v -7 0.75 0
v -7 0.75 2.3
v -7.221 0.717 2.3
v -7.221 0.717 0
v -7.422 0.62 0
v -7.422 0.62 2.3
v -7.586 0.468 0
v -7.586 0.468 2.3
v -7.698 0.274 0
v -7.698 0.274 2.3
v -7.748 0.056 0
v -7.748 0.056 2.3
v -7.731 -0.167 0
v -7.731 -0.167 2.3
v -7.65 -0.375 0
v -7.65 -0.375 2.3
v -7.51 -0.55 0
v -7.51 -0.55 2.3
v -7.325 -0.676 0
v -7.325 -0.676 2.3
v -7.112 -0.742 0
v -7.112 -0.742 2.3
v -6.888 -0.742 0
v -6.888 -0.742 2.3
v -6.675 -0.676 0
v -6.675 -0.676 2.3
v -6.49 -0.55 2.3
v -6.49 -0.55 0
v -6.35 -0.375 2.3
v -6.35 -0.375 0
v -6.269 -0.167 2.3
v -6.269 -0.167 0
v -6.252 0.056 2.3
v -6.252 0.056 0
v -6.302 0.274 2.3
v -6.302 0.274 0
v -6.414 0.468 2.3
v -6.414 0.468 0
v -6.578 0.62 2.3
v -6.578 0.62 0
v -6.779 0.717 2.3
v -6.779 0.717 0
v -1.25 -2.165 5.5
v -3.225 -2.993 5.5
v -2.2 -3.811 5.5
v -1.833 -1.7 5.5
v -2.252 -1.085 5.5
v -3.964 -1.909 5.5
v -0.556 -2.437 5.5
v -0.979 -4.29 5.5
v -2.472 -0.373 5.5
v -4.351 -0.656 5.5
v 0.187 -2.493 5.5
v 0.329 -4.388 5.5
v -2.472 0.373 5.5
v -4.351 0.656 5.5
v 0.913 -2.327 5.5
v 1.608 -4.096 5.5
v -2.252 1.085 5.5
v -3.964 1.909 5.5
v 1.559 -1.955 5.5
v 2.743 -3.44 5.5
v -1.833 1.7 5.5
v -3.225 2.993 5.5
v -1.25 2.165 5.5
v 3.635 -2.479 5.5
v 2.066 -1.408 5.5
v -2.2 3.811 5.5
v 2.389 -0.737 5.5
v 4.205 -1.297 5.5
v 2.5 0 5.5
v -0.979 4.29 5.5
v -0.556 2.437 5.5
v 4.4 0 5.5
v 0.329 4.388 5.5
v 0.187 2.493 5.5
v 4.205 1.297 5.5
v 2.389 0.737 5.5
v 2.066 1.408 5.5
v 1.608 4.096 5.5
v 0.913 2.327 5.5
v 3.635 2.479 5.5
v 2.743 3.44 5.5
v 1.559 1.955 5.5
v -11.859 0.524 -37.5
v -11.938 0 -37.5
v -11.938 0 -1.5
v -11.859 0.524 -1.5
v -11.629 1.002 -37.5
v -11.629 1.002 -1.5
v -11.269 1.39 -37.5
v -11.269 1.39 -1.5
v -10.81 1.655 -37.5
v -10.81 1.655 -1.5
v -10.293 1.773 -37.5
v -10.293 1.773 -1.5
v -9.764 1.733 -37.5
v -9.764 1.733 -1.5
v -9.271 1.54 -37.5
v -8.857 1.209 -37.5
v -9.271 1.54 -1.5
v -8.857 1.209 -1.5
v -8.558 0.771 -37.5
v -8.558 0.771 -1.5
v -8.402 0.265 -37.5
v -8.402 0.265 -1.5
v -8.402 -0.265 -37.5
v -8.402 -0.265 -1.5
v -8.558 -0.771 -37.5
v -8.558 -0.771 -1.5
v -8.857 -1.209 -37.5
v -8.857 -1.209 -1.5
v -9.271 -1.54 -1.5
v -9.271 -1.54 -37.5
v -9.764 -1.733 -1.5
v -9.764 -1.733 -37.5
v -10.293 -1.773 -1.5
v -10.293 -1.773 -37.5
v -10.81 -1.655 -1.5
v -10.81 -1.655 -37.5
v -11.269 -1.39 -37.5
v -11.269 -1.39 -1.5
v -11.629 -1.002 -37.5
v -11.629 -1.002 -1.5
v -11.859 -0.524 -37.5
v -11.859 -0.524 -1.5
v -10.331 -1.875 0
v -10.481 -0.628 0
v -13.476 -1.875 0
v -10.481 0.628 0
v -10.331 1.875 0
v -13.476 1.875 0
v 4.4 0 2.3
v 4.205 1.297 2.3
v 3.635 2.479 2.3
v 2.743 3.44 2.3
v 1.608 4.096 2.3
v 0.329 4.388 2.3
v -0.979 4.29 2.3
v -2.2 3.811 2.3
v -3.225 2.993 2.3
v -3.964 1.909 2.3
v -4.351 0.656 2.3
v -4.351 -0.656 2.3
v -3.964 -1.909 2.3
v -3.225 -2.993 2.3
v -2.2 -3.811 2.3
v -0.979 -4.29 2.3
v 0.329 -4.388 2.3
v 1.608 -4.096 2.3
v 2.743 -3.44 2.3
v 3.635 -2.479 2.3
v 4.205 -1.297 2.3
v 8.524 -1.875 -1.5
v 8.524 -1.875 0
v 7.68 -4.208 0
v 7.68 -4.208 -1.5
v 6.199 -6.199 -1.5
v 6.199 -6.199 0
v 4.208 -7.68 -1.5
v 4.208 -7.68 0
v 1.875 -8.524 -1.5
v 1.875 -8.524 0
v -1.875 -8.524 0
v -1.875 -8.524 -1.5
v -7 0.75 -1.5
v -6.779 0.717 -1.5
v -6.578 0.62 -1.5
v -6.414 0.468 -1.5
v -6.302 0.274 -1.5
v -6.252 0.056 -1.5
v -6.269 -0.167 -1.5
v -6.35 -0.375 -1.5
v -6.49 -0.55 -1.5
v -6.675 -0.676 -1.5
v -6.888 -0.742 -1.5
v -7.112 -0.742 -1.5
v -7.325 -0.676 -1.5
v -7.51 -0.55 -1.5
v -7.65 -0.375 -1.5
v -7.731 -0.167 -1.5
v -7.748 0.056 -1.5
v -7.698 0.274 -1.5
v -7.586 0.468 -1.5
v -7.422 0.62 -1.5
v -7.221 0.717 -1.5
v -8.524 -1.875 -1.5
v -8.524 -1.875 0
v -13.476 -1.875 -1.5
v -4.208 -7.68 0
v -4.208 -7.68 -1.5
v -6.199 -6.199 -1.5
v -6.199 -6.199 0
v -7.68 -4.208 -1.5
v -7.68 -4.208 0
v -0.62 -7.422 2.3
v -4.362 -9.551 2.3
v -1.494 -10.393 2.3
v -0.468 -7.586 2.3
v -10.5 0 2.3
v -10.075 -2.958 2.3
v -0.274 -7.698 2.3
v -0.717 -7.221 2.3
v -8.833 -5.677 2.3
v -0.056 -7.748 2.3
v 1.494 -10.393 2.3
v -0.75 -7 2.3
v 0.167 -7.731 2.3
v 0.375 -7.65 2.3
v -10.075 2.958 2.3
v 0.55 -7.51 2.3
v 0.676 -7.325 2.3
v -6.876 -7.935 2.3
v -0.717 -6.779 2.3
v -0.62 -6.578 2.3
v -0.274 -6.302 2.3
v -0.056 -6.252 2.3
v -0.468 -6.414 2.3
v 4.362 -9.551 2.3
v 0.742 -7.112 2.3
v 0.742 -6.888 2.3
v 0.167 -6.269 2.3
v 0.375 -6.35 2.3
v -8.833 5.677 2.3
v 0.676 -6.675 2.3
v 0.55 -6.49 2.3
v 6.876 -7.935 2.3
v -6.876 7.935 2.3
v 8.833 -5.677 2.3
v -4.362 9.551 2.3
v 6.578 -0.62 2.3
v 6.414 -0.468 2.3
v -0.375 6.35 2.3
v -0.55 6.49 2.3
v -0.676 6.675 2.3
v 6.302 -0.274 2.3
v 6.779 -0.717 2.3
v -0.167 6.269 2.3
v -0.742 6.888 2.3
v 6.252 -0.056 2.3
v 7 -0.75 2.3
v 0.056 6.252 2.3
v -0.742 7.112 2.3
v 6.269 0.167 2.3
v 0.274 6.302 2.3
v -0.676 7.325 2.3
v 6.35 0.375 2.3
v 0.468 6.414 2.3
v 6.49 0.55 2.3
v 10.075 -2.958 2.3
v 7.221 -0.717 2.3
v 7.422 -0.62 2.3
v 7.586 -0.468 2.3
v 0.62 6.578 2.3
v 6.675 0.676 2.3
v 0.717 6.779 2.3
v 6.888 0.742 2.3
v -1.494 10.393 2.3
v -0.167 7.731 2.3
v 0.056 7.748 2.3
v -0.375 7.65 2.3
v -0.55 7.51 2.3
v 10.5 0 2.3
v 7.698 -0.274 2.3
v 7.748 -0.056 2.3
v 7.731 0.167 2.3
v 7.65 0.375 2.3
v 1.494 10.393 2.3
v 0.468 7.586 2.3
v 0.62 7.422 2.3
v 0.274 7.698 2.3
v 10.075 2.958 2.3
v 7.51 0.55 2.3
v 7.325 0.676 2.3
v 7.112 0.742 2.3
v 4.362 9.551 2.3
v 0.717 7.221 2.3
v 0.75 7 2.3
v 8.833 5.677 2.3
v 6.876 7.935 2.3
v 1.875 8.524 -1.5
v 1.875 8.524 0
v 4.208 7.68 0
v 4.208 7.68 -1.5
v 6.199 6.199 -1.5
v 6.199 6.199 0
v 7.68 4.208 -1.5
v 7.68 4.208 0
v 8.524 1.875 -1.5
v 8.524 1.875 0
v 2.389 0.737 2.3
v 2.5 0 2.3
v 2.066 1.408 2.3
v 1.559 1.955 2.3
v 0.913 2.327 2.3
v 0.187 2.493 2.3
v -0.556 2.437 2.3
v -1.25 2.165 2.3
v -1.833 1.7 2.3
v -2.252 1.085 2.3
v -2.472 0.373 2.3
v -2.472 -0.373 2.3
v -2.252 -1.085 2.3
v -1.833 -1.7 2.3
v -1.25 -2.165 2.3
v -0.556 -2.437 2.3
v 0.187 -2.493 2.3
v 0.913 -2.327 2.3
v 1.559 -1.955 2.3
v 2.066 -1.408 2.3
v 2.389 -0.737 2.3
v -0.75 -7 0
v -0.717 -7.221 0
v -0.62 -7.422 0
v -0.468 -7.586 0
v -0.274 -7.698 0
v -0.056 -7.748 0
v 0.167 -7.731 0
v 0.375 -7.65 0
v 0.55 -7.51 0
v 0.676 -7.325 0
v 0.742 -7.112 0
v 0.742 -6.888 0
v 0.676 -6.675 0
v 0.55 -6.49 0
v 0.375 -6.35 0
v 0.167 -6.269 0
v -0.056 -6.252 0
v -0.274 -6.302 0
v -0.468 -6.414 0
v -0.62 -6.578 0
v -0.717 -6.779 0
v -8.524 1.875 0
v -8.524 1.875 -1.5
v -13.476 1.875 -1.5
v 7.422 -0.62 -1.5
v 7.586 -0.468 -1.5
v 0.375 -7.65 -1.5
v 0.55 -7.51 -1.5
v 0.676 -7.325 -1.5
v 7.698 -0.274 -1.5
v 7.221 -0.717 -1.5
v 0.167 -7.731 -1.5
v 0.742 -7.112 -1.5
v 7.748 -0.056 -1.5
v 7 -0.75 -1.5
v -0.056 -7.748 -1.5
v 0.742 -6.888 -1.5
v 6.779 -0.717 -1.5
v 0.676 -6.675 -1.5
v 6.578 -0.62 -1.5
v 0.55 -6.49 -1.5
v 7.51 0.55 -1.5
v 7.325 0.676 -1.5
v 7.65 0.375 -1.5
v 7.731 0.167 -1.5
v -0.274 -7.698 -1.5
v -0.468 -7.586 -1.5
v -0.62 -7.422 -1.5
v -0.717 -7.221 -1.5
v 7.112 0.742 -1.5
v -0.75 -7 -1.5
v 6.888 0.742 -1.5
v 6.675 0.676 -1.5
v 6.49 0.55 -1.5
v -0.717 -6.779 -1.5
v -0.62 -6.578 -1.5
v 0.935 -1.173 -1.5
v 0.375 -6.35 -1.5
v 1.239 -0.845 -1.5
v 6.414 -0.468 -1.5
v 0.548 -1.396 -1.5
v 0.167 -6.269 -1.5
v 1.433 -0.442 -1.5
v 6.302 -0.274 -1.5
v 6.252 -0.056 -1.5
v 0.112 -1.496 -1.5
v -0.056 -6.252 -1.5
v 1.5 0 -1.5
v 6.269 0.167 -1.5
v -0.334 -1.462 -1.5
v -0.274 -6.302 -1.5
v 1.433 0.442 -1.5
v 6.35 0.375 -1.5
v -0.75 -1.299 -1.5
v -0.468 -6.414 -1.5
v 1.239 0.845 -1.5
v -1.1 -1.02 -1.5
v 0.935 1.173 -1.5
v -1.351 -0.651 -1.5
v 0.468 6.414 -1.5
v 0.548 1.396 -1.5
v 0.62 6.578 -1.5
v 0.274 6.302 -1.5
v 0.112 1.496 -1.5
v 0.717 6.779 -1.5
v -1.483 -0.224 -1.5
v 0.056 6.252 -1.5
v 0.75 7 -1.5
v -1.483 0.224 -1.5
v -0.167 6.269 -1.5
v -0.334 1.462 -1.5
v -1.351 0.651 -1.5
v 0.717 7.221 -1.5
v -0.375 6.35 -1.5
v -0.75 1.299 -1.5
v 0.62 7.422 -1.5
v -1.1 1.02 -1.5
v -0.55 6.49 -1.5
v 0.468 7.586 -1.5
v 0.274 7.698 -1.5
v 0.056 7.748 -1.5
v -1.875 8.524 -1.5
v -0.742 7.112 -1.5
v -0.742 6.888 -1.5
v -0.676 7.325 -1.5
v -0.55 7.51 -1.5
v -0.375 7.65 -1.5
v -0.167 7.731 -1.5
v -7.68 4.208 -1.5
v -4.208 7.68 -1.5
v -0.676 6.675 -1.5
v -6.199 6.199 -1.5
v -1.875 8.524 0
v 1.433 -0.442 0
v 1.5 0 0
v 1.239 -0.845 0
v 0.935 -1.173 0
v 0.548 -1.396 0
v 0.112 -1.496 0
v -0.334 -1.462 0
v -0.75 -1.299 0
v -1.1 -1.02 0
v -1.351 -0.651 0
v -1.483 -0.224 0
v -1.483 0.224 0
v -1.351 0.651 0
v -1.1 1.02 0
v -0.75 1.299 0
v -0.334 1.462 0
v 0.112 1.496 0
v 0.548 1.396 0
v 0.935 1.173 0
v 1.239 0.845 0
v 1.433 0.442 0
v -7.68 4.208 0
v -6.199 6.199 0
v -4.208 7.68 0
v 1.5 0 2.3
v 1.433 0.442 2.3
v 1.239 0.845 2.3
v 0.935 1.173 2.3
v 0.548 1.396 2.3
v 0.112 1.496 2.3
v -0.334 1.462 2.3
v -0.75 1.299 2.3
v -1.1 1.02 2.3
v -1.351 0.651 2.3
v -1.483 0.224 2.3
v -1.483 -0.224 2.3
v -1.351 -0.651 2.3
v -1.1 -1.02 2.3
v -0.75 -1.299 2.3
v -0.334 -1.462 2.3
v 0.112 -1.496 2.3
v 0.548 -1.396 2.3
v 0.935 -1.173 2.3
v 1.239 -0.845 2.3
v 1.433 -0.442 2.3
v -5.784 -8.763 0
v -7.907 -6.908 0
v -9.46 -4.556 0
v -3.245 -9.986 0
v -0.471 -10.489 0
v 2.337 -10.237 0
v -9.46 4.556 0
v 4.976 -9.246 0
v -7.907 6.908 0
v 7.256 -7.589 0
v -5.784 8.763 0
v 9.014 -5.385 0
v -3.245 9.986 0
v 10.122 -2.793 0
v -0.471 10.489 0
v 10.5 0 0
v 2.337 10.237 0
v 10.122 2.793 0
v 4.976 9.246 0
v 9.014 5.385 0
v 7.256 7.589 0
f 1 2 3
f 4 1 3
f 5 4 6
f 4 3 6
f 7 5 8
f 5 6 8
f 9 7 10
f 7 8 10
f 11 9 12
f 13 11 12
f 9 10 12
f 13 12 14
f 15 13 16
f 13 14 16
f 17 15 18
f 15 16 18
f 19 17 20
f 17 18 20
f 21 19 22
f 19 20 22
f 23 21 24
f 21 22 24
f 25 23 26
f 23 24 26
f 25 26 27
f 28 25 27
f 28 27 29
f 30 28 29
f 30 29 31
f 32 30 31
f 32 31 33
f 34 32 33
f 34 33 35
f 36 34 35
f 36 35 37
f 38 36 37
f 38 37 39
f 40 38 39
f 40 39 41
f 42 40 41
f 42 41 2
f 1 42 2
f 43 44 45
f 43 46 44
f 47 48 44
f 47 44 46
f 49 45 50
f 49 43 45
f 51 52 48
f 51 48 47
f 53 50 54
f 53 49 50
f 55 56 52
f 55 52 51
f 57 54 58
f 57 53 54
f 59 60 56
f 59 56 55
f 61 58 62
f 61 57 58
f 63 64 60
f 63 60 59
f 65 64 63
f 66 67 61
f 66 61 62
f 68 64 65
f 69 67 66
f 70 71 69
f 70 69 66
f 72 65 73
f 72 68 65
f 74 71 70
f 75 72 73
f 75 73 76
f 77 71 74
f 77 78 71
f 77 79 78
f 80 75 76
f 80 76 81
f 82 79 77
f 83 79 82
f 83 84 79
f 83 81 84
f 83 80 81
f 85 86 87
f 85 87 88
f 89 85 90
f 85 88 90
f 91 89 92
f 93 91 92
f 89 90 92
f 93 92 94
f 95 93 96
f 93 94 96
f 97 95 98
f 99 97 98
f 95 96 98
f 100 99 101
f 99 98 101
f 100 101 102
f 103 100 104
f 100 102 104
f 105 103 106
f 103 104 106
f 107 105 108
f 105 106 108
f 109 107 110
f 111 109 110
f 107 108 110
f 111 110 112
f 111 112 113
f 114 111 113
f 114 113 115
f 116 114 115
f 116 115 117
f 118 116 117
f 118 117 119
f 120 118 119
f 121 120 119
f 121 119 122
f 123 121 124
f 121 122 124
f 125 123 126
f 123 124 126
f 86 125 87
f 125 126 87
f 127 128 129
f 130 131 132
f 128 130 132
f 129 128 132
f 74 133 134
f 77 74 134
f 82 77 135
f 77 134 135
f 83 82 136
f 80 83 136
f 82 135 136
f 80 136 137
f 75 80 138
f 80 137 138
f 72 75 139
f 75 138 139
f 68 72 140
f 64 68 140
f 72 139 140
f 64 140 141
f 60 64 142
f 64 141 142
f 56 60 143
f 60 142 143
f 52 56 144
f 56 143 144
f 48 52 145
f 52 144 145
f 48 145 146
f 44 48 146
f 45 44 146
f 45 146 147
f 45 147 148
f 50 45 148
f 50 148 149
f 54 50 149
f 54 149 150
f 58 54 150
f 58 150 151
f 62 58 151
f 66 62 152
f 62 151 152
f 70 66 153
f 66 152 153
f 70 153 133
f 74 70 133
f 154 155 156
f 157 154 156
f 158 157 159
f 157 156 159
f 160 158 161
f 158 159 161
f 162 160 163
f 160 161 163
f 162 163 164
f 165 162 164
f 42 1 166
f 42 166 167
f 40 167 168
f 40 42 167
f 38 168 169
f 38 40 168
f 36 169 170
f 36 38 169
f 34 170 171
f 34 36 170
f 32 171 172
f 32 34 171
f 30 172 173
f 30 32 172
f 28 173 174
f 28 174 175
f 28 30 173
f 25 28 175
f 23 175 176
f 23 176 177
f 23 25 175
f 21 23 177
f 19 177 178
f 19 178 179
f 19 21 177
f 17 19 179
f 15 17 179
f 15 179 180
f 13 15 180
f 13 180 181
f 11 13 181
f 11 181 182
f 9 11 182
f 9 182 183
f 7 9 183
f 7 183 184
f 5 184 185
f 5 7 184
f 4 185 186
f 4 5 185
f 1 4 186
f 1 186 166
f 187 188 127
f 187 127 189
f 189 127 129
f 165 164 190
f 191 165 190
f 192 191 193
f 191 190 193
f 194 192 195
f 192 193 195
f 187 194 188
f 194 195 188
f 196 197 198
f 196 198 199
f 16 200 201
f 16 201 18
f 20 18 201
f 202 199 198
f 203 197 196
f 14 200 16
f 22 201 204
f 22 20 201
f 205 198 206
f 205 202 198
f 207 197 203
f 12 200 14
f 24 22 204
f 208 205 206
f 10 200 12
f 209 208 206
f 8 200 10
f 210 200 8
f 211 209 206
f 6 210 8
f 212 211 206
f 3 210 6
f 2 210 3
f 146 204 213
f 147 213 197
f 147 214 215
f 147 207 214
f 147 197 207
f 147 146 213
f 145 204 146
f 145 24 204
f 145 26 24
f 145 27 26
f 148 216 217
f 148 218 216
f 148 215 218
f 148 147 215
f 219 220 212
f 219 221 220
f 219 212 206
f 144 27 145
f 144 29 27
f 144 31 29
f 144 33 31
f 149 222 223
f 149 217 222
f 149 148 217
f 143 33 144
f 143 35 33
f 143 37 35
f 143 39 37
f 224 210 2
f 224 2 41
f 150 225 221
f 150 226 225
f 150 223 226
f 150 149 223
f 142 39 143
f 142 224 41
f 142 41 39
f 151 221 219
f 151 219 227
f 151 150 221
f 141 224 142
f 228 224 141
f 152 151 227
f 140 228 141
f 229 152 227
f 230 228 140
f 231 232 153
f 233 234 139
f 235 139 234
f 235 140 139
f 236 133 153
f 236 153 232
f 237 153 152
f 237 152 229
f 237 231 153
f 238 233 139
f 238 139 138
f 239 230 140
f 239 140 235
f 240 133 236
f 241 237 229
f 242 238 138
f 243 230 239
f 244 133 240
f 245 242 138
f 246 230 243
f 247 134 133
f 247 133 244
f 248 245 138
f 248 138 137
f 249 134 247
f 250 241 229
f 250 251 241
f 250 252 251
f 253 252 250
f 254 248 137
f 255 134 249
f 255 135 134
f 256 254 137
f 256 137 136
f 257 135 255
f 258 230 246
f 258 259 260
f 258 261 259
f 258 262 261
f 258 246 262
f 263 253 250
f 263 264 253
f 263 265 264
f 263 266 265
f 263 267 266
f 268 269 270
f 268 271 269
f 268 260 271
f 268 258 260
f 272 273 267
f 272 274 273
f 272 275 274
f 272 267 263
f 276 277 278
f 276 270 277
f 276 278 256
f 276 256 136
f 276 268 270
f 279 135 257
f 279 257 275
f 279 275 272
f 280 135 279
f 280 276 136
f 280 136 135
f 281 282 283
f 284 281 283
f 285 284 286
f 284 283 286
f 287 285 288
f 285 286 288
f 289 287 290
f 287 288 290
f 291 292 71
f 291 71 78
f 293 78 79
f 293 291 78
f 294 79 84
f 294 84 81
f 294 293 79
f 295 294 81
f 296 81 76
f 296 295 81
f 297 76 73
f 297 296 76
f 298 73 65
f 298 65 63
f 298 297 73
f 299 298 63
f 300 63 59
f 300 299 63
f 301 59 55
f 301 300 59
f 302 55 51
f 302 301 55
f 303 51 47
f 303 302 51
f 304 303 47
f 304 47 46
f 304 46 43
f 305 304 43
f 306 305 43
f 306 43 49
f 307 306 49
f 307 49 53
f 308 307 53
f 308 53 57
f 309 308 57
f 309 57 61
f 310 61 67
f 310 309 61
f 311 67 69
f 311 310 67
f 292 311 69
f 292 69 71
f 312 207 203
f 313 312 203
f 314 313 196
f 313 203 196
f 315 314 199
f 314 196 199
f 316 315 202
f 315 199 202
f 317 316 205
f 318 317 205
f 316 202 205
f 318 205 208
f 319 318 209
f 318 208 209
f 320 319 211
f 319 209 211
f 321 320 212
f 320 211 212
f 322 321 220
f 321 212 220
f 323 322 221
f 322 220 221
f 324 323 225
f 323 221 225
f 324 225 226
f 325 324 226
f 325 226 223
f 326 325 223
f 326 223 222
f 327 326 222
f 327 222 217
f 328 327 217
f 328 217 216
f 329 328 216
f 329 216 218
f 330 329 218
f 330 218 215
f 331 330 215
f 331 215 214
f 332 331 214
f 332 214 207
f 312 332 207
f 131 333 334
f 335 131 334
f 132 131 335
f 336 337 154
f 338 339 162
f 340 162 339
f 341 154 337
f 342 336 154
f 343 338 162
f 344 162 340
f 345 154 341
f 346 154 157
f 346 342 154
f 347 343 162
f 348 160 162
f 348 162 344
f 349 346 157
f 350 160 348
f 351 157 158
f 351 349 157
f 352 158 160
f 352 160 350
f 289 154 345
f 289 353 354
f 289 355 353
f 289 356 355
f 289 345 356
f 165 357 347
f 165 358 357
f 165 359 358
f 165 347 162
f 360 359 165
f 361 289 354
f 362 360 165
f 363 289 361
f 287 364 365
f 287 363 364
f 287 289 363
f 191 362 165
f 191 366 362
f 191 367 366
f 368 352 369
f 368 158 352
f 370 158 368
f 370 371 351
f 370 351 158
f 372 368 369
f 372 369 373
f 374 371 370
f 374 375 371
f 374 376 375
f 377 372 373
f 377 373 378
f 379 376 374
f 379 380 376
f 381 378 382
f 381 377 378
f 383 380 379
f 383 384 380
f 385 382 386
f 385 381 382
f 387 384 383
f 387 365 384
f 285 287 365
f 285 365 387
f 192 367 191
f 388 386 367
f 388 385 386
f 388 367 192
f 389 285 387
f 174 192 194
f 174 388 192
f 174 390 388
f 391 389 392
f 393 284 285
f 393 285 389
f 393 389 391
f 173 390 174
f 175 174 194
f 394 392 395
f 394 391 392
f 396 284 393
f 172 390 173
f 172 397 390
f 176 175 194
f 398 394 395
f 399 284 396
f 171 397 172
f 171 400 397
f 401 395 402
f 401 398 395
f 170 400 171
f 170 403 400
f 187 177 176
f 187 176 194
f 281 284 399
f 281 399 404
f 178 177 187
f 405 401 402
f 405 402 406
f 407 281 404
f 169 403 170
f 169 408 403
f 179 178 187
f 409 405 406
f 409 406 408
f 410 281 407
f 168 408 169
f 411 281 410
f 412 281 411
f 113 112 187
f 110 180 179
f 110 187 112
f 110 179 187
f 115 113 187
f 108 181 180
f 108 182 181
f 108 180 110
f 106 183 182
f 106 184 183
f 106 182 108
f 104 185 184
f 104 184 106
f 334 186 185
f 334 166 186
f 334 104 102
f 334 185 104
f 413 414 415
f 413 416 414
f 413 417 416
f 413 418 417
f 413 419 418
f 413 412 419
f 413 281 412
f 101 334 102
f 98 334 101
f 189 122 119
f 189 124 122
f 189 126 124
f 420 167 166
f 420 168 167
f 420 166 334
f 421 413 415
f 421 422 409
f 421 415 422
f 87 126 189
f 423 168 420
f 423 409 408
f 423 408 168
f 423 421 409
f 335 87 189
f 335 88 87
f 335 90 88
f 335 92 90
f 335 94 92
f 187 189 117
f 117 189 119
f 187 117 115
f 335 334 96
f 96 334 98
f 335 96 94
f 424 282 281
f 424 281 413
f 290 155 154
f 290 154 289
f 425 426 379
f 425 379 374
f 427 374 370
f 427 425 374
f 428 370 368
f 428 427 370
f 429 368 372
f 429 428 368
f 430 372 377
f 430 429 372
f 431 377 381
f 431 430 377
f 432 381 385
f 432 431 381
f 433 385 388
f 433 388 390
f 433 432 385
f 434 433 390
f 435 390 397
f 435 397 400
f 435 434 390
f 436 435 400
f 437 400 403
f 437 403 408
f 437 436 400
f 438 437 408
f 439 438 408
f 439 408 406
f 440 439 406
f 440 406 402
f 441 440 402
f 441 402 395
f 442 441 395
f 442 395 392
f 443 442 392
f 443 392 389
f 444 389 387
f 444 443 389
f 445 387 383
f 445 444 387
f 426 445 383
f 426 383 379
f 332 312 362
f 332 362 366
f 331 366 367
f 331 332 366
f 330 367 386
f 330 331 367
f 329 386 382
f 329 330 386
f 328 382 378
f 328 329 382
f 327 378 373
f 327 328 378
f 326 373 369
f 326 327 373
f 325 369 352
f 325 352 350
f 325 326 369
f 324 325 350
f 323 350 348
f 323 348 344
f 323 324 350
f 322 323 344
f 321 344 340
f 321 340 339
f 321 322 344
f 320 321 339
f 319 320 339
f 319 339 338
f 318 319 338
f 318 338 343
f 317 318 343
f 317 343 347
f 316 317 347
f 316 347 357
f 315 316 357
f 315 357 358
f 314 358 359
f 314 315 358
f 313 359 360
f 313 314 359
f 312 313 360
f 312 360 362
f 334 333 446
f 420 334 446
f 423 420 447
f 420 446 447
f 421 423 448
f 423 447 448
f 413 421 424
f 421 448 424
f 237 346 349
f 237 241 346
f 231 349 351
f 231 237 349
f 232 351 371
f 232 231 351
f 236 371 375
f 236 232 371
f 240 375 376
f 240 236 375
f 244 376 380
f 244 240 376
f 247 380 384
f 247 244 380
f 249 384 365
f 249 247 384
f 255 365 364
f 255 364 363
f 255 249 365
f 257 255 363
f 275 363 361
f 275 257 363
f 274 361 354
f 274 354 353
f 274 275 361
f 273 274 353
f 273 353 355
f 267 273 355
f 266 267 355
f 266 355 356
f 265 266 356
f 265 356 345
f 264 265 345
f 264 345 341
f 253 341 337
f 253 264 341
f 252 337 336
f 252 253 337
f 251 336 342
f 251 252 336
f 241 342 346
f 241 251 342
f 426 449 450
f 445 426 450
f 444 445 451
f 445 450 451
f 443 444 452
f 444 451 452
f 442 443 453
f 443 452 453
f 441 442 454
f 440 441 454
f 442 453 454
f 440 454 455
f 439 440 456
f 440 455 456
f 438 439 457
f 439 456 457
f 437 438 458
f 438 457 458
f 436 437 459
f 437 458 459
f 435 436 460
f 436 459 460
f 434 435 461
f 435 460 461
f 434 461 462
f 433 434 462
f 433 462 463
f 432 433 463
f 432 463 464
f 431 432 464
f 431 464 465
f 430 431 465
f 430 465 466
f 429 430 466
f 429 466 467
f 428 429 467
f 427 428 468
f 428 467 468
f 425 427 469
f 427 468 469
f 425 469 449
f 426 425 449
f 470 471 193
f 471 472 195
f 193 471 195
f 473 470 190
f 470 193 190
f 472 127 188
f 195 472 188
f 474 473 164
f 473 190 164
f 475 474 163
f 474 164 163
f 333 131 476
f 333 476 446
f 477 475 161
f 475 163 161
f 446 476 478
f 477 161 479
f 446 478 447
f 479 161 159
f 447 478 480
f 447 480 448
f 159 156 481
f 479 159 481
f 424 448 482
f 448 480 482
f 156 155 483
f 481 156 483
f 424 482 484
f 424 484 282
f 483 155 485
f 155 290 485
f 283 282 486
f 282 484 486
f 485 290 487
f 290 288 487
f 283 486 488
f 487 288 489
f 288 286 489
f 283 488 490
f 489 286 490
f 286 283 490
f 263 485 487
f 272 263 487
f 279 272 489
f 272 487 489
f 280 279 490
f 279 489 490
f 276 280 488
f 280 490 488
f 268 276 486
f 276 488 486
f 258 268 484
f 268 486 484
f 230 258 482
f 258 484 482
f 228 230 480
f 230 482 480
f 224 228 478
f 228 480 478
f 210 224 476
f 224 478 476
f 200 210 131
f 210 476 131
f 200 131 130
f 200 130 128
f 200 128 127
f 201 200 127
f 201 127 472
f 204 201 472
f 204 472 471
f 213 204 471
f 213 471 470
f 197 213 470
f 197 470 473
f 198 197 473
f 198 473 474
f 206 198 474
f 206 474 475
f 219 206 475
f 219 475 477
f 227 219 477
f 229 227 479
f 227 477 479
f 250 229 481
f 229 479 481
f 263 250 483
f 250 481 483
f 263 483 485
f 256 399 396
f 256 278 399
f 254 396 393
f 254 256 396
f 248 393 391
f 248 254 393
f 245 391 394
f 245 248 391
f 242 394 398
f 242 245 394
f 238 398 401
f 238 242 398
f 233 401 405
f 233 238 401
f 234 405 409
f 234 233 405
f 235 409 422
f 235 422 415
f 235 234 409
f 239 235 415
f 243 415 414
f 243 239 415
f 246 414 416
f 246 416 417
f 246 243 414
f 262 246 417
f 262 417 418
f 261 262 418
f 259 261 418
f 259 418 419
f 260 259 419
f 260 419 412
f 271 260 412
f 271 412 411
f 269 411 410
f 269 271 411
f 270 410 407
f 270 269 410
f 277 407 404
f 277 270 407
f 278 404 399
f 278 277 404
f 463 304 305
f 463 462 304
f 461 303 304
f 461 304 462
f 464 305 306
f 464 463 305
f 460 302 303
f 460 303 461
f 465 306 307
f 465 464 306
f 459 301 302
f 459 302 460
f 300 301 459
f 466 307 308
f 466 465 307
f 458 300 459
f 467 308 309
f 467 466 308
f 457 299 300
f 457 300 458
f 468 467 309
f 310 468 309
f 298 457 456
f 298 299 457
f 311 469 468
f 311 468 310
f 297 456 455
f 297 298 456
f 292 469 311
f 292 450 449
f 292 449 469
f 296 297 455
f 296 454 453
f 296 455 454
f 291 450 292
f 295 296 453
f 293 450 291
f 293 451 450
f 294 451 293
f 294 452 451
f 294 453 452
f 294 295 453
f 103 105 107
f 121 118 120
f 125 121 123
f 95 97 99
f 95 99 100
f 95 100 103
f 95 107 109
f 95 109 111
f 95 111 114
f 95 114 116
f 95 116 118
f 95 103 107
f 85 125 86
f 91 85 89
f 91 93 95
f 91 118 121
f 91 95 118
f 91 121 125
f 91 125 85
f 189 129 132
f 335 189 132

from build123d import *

# Parameters (mm, degrees)
SKETCH1_R           = 10.5
BOSS_EXTRUDE1_DEPTH = 2.3
SKETCH2_R           = 0.75
CUT_EXTRUDE1_DEPTH  = 16.026310259
SKETCH3_R           = 1.5
CUT_EXTRUDE2_DEPTH  = 2.3
CIRPATTERN1_COUNT   = 4
SKETCH4_R           = 4.4
SKETCH4_R_2         = 2.5
BOSS_EXTRUDE2_DEPTH = 3.2
SKETCH5_W           = 22
SKETCH5_H           = 3.75
SKETCH5_R           = 0.75
SKETCH5_R_2         = 1.5
BOSS_EXTRUDE3_DEPTH = 1.5
SKETCH6_R           = 1.778
BOSS_EXTRUDE4_DEPTH = 36
SKETCH7_W           = 3.75
SKETCH7_H           = 6.6491
SKETCH7_R           = 0.75
BOSS_EXTRUDE5_DEPTH = 1.5


with BuildPart() as part:
    # Sketch1 → Boss-Extrude1 (new body)
    with BuildSketch(Plane.XY):
        Circle(SKETCH1_R)
    extrude(amount=BOSS_EXTRUDE1_DEPTH)

    # Sketch2 → Cut-Extrude1 (cut, through all)
    with BuildSketch(Plane.XY.offset(2.3)):
        with Locations((0, 7)):
            Circle(SKETCH2_R)
    cut_extrude1 = extrude(amount=-CUT_EXTRUDE1_DEPTH, mode=Mode.SUBTRACT)

    # Sketch3 → Cut-Extrude2 (cut)
    with BuildSketch(Plane.XY.offset(2.3)):
        Circle(SKETCH3_R)
    extrude(amount=-CUT_EXTRUDE2_DEPTH, mode=Mode.SUBTRACT)

    # CirPattern1: Cut-Extrude1 ×4 about axis
    cirpattern1_axis = Axis((0, 0, 0), (0, 0, 1))
    for i in range(1, CIRPATTERN1_COUNT):
        add(cut_extrude1.rotate(cirpattern1_axis, i * 360 / CIRPATTERN1_COUNT), mode=Mode.SUBTRACT)

    # Sketch4 → Boss-Extrude2 (add)
    with BuildSketch(Plane.XY.offset(2.3)):
        Circle(SKETCH4_R)
        Circle(SKETCH4_R_2, mode=Mode.SUBTRACT)
    extrude(amount=BOSS_EXTRUDE2_DEPTH)

    # Sketch5 → Boss-Extrude3 (add)
    with BuildSketch(Plane(origin=(0, 0, 0), x_dir=(-1, 0, 0), z_dir=(0, 0, -1))):
        with Locations((2.475846117, 0)):
            Rectangle(SKETCH5_W, SKETCH5_H)
        with Locations(Location((7, 0, 0), (0, 0, 90))):
            Circle(SKETCH5_R, mode=Mode.SUBTRACT)
        with Locations(Location((-7, 0, 0), (0, 0, 270))):
            Circle(SKETCH5_R, mode=Mode.SUBTRACT)
        with Locations(Location((0, 0, 0), (0, 0, 180))):
            Circle(SKETCH5_R_2, mode=Mode.SUBTRACT)
    extrude(amount=BOSS_EXTRUDE3_DEPTH)

    # Sketch6 → Boss-Extrude4 (add)
    with BuildSketch(Plane(origin=(0, 0, -1.5), x_dir=(-1, 0, 0), z_dir=(0, 0, -1))):
        with Locations((10.16, 0)):
            Circle(SKETCH6_R)
    extrude(amount=BOSS_EXTRUDE4_DEPTH)

    # Sketch7 → Boss-Extrude5 (add)
    with BuildSketch(Plane(origin=(0, 0, 0), x_dir=(-1, 0, 0), z_dir=(0, 0, -1))):
        with BuildLine():
            Line((-8.524153883, 1.875), (-1.875, 1.875))
            Line((-1.875, 1.875), (-1.875, 8.5241))
            ThreePointArc((-1.875, 8.5241), (-6.199356528, 6.199337688), (-8.524153883, 1.875))
        make_face()
        with BuildLine():
            Line((1.875, 8.5241), (1.875, 1.875))
            Line((1.875, 1.875), (8.5241, 1.875))
            ThreePointArc((8.5241, 1.875), (6.199324729, 6.199324729), (1.875, 8.5241))
        make_face()
        with BuildLine():
            Line((-1.875, -8.5241), (-1.875, -1.875))
            Line((-1.875, -1.875), (-8.524153883, -1.875))
            ThreePointArc((-8.524153883, -1.875), (-6.199356528, -6.199337688), (-1.875, -8.5241))
        make_face()
        with BuildLine():
            Line((8.5241, -1.875), (1.875, -1.875))
            Line((1.875, -1.875), (1.875, -8.5241))
            ThreePointArc((1.875, -8.5241), (6.199324729, -6.199324729), (8.5241, -1.875))
        make_face()
        with Locations((0, -5.19955)):
            Rectangle(SKETCH7_W, SKETCH7_H)
        with Locations((0, -7)):
            Circle(SKETCH7_R, mode=Mode.SUBTRACT)
        with Locations((0, 5.19955)):
            Rectangle(SKETCH7_W, SKETCH7_H)
        with Locations(Location((0, 7, 0), (0, 0, 180))):
            Circle(SKETCH7_R, mode=Mode.SUBTRACT)
    extrude(amount=BOSS_EXTRUDE5_DEPTH)


solid = part.part
